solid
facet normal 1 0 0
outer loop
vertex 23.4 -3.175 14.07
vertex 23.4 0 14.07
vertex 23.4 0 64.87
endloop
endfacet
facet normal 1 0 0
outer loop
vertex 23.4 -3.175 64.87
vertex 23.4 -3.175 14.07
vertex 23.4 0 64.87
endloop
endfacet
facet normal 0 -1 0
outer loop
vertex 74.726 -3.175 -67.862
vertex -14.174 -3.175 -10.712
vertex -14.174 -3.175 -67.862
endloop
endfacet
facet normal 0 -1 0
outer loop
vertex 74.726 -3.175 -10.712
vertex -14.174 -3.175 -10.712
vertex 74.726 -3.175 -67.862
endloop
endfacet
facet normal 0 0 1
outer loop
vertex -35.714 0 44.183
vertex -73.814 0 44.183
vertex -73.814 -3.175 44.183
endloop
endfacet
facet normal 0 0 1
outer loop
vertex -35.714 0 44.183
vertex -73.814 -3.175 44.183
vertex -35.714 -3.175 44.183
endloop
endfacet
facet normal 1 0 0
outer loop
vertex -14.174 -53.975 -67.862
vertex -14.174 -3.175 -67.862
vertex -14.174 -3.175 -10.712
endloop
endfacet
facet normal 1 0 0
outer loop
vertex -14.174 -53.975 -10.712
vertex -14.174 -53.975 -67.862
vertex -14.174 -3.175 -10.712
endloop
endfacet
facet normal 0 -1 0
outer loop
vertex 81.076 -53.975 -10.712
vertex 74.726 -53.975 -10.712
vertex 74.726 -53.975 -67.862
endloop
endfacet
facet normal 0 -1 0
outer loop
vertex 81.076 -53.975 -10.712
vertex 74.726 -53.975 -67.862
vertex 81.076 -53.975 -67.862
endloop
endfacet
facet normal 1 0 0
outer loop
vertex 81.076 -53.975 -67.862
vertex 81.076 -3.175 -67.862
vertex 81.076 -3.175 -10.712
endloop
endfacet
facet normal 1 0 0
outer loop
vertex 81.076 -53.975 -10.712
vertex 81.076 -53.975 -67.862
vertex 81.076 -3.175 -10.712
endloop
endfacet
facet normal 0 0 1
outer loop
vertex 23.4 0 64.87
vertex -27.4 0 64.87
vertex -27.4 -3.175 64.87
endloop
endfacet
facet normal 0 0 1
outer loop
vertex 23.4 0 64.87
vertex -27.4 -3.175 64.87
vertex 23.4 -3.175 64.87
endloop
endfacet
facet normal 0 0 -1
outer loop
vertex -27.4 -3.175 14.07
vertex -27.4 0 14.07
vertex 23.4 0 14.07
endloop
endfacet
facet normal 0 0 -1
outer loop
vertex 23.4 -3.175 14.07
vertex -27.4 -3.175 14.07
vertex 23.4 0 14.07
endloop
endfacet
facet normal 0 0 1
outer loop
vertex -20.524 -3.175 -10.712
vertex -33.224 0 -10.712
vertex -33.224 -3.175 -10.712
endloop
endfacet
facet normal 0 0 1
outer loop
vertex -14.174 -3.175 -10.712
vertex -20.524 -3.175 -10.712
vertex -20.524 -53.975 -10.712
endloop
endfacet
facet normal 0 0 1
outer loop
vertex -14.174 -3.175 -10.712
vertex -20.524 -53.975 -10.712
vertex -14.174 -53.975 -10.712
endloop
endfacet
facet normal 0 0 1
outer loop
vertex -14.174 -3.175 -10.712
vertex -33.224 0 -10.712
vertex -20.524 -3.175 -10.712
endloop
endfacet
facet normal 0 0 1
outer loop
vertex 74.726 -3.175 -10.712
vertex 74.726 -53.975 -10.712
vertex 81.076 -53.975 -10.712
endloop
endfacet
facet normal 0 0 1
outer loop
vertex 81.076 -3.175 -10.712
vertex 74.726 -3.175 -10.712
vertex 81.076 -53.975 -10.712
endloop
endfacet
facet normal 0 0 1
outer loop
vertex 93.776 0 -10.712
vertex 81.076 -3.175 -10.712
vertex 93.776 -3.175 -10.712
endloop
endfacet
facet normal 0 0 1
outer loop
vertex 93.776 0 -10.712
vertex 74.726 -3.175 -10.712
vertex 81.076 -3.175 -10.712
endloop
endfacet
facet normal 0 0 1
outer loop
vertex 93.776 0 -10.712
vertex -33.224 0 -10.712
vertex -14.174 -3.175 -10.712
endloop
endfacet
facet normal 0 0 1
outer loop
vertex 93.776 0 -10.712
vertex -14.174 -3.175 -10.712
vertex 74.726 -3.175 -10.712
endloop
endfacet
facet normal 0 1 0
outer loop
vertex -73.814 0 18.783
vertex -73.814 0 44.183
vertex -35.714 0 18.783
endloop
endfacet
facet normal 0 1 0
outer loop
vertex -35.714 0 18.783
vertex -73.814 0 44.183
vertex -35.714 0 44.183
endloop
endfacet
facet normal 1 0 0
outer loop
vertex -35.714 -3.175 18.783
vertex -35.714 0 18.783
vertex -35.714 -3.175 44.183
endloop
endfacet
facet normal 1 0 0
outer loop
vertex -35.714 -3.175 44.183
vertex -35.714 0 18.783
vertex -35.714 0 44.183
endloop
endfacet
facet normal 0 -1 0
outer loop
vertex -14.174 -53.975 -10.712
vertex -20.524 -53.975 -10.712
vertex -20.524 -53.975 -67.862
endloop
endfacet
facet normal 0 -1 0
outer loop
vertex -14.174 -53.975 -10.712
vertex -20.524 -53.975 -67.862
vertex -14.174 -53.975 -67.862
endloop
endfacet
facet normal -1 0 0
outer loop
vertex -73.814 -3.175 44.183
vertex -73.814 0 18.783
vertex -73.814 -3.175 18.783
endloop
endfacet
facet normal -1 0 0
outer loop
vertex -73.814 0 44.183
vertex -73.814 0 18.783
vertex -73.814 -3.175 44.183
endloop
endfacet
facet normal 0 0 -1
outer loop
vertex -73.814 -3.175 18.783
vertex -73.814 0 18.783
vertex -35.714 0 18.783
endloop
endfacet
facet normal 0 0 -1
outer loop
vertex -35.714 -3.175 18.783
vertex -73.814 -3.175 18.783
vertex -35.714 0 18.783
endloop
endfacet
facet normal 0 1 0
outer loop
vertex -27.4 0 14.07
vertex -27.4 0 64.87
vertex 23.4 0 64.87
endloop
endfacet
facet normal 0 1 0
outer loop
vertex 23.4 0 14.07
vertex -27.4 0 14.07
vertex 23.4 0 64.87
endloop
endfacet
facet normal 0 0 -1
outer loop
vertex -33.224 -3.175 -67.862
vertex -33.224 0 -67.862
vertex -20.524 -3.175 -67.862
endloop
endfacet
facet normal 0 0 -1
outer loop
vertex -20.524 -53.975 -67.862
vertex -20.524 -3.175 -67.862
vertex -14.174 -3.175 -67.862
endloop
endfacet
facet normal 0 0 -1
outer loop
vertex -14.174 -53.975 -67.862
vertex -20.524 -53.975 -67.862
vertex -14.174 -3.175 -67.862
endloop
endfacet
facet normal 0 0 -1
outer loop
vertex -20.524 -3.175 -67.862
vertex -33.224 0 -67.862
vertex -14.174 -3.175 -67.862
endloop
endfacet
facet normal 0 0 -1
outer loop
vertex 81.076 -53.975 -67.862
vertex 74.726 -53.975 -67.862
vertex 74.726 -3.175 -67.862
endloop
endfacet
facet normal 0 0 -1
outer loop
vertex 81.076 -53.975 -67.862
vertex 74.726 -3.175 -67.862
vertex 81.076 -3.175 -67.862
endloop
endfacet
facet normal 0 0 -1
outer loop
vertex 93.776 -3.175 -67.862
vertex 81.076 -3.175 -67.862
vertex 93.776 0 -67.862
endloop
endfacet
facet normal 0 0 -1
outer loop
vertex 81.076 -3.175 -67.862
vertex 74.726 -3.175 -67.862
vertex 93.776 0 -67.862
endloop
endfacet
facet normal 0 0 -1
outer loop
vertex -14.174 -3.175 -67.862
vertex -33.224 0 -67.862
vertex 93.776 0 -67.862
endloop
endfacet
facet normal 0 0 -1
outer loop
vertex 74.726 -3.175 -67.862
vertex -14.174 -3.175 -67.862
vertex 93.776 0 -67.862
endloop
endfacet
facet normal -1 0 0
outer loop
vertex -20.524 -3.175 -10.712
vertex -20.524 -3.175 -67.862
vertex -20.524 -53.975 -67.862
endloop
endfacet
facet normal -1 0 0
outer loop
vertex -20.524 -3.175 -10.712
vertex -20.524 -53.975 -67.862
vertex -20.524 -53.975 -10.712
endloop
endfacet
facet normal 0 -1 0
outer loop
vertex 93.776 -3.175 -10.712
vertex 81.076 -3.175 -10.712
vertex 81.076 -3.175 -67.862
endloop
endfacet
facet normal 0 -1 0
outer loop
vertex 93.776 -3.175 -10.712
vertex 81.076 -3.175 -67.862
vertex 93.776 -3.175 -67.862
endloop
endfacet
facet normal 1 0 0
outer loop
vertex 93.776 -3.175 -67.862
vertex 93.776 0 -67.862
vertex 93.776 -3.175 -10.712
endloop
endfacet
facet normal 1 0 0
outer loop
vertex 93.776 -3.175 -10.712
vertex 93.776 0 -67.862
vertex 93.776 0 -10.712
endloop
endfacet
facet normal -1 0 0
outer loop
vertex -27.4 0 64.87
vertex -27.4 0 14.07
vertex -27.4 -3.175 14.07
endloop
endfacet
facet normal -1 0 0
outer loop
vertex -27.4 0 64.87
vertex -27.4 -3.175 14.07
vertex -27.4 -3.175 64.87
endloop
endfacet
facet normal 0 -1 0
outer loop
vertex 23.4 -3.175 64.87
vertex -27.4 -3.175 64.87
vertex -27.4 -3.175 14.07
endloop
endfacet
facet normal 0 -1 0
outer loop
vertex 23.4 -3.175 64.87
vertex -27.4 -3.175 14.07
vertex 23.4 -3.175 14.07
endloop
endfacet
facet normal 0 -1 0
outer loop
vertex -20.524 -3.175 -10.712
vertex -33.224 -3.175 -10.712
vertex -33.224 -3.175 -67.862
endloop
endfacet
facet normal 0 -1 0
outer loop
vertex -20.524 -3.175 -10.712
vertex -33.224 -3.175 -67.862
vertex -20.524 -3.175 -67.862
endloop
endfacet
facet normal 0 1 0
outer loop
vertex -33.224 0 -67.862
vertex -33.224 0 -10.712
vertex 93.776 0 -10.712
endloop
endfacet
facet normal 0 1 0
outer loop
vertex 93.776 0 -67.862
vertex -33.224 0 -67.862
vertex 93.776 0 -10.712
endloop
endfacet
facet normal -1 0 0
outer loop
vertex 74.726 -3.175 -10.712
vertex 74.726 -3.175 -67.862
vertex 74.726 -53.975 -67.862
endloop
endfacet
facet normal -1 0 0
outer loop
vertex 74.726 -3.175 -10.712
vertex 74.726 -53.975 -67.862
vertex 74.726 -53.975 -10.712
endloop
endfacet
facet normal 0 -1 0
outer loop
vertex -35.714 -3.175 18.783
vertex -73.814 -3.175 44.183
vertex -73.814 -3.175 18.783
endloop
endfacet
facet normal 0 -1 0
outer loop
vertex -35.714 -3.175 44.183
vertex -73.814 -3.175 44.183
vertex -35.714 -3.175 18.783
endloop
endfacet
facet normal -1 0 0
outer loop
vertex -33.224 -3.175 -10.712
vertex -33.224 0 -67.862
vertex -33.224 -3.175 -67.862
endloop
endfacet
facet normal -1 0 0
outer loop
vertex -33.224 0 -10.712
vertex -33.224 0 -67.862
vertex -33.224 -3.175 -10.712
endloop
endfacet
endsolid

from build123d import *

# Parameters (mm, degrees)
F0_W     = 38.1
F0_H     = 25.4
F0_W_2   = 50.8
F0_H_2   = 50.8
F0_W_3   = 127
F0_H_3   = 57.15
F1_DEPTH = 3.175
F2_W     = 6.35
F2_H     = 57.15
F3_DEPTH = 50.8


with BuildPart() as f1:
    # F0 (on Front) → F1 (new body)
    with BuildSketch(Plane.XZ):
        with Locations((-54.764102, 31.482835)):
            Rectangle(F0_W, F0_H)
        with Locations((-2.000252, 39.470079)):
            Rectangle(F0_W_2, F0_H_2)
        with Locations((30.276334, -39.287146)):
            Rectangle(F0_W_3, F0_H_3)
    extrude(amount=F1_DEPTH)

    # F2 (on face) → F3 (join)
    with BuildSketch(Plane.XZ.offset(3.175)):
        with Locations((-17.348666, -39.287146)):
            Rectangle(F2_W, F2_H)
        with Locations((77.901334, -39.287146)):
            Rectangle(F2_W, F2_H)
    extrude(amount=F3_DEPTH)


solid = f1.part
